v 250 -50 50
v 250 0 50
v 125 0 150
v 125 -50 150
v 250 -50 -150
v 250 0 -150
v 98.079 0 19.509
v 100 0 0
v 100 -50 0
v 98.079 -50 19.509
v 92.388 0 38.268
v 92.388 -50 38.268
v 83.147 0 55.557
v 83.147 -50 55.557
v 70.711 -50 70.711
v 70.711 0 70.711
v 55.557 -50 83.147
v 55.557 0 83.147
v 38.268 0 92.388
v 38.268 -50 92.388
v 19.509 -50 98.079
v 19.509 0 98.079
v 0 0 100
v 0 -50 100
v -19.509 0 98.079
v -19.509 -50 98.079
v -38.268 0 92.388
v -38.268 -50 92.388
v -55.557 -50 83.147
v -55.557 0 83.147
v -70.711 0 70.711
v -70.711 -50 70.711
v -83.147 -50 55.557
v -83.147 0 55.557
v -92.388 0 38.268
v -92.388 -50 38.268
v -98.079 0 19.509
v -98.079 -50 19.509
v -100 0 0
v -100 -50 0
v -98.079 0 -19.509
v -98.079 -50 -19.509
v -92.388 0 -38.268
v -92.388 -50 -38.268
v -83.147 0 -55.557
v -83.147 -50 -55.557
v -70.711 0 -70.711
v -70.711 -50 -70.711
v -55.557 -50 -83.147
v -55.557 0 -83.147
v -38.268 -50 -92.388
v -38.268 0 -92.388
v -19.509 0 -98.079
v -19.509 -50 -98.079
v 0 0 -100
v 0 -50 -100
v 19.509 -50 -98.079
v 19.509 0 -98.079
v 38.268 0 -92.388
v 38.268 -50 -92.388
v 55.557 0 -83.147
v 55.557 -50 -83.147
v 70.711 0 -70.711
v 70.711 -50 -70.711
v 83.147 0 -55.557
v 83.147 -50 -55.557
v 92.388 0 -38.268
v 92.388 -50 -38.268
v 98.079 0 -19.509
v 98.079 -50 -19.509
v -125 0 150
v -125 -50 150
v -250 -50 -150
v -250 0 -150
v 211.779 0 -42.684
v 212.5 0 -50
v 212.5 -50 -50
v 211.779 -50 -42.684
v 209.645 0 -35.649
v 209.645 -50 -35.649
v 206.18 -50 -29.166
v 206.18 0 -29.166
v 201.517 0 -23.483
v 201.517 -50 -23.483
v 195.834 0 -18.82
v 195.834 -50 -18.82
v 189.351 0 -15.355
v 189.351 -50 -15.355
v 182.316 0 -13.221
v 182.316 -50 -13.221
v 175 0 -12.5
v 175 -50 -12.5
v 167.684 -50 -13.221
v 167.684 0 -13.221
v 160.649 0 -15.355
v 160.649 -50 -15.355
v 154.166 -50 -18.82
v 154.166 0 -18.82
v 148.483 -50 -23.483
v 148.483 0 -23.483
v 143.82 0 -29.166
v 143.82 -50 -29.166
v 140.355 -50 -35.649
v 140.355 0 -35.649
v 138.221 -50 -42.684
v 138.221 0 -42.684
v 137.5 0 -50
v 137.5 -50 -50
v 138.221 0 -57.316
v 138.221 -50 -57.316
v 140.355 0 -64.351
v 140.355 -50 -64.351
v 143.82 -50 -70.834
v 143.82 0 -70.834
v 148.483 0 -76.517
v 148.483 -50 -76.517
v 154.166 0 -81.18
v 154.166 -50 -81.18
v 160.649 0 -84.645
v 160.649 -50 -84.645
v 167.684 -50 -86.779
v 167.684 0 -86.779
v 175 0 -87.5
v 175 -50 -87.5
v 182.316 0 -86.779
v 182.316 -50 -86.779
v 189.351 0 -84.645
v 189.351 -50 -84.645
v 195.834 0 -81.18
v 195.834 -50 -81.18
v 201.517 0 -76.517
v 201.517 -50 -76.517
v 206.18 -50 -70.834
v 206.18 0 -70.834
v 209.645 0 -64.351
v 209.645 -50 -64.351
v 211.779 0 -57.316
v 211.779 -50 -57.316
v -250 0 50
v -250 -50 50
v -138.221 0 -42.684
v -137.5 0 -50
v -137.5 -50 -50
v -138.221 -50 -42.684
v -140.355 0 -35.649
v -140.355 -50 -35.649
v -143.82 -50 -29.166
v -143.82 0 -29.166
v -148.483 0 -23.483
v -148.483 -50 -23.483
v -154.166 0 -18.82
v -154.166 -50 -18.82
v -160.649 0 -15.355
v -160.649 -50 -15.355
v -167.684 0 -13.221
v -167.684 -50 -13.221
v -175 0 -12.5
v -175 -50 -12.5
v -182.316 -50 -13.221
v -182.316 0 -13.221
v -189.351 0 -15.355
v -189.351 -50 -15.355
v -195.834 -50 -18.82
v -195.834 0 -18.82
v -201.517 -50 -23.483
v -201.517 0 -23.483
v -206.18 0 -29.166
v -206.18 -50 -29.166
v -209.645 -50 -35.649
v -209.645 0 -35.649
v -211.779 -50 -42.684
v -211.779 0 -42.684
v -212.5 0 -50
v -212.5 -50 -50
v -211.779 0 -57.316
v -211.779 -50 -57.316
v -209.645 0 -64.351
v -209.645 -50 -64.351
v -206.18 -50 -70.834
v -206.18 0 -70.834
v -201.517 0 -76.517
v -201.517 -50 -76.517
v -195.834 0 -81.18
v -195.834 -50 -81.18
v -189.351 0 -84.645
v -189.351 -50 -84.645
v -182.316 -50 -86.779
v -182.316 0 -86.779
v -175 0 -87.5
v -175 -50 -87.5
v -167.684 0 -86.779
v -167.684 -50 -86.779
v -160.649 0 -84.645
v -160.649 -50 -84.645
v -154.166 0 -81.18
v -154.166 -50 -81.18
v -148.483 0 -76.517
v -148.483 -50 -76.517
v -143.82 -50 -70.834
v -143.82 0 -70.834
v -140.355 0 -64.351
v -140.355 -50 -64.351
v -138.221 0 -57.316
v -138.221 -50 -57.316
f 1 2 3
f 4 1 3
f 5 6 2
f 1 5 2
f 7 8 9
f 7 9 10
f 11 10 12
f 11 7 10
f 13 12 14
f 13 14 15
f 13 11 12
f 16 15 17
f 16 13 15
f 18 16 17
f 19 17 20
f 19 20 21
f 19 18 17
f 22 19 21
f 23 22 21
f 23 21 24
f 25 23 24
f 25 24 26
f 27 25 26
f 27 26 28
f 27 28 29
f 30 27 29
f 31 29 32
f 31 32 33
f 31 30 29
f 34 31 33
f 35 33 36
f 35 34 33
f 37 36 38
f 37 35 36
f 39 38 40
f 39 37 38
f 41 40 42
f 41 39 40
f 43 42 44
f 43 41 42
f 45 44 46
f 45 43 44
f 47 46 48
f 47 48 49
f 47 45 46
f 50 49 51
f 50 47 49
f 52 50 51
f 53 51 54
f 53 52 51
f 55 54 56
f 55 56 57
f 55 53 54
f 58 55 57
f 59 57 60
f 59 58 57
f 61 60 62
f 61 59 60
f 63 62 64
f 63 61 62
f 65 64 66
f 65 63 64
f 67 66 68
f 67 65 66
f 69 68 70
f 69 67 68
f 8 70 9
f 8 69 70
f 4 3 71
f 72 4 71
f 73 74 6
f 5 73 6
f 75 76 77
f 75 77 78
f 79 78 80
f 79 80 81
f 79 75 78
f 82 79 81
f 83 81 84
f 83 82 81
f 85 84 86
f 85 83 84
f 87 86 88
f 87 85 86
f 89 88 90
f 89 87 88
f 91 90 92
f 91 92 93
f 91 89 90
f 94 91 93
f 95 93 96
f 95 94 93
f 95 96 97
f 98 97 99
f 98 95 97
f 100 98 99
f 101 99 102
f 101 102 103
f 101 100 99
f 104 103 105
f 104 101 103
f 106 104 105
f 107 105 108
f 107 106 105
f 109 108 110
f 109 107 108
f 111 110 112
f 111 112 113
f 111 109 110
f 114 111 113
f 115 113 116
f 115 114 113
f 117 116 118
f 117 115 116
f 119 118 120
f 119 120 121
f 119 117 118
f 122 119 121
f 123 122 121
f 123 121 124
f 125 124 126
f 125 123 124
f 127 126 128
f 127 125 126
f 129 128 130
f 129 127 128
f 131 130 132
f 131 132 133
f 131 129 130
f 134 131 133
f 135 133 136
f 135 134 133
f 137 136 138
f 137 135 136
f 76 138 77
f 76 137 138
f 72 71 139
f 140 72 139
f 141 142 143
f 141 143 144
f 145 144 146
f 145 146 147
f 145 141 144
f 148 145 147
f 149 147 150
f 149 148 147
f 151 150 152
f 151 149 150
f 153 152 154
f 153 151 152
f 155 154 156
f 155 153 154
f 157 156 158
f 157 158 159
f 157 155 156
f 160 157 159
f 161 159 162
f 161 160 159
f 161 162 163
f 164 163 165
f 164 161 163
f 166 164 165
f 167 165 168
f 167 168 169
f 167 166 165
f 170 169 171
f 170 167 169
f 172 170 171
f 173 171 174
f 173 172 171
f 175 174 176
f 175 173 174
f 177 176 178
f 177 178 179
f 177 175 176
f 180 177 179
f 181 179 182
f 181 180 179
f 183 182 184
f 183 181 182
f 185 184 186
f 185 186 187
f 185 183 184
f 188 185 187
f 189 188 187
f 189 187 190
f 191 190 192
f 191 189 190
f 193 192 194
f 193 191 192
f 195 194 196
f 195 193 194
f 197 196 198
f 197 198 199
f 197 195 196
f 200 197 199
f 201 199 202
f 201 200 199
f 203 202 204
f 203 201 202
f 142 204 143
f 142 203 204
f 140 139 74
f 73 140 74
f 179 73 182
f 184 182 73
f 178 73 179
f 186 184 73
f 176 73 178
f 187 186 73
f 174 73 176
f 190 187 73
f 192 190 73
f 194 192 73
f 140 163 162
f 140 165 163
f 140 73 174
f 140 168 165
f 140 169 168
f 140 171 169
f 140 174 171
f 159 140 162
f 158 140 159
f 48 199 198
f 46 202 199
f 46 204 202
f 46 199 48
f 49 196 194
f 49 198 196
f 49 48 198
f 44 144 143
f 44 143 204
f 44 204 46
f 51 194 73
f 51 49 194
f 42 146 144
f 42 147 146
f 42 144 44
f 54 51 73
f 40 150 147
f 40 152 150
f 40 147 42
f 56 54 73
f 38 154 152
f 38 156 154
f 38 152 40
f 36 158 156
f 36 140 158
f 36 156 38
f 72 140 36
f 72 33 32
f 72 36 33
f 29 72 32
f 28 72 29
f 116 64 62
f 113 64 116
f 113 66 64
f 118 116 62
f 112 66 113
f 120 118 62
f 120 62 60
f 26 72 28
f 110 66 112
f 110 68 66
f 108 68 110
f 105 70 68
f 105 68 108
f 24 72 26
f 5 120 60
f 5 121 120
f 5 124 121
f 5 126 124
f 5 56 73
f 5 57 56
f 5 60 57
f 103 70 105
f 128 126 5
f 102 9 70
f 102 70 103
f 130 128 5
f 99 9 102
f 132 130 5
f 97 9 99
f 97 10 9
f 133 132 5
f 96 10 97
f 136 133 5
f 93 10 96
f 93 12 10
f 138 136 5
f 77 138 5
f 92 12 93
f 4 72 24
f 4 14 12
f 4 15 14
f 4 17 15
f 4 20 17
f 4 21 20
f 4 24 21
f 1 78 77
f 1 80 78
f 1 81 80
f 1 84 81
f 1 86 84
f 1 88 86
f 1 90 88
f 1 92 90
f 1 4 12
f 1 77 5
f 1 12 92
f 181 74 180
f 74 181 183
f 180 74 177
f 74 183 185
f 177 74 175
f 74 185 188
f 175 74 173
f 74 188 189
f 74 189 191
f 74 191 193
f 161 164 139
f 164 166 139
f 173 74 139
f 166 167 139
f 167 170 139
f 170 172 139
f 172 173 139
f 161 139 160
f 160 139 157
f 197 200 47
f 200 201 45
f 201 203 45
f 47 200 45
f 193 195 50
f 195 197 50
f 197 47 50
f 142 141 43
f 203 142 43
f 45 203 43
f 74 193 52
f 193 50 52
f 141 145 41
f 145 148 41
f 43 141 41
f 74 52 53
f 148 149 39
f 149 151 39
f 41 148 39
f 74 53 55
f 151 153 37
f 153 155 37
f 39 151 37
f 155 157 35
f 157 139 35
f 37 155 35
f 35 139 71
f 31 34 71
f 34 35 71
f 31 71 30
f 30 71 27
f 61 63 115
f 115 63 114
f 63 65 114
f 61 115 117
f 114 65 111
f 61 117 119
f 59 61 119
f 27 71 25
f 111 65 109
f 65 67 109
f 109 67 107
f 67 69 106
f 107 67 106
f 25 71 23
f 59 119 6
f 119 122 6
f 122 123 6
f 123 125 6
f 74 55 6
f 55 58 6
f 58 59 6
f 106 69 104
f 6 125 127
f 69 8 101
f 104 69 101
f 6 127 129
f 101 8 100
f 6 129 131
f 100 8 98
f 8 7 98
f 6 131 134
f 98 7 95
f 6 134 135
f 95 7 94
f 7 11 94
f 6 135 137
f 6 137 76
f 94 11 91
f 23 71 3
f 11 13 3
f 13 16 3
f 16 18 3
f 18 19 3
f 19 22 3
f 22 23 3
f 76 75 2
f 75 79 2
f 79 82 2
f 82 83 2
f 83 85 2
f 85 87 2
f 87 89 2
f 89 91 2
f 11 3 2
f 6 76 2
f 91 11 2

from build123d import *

# Parameters (mm, degrees)
F0_R     = 37.5
F0_R_2   = 100
F1_DEPTH = 50


with BuildPart() as f1:
    # F0 (on Front) → F1 (new body)
    with BuildSketch(Plane.XZ):
        Polygon((250, 50), (125, 150), (-125, 150), (-250, 50), (-250, 0), (-250, -150), (0, -150), (175, -150), (250, -150), (250, -50), align=None)
        with Locations((-175, -50)):
            Circle(F0_R, mode=Mode.SUBTRACT)
        with Locations((175, -50)):
            Circle(F0_R, mode=Mode.SUBTRACT)
        Circle(F0_R_2, mode=Mode.SUBTRACT)
    extrude(amount=F1_DEPTH)


solid = f1.part
